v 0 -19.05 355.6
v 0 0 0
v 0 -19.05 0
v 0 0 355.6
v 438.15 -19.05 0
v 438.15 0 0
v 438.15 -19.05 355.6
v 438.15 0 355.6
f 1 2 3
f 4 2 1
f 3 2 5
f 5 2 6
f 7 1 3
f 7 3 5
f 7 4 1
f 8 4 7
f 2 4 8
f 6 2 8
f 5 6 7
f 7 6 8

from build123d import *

# Parameters (mm, degrees)
F0_W     = 438.15
F0_H     = 355.6
F1_DEPTH = 19.05
F0_W_2   = 8.1390114404
F0_H_2   = 77.3205896731


with BuildPart() as f1:
    # F0 (on Front) → F1 (new body)
    with BuildSketch(Plane.XZ):
        with Locations((219.075, 177.8)):
            Rectangle(F0_W, F0_H)
    extrude(amount=F1_DEPTH)


with BuildPart() as f1b:
    # F0 (on Front) → F1, piece 2 (new body)
    with BuildSketch(Plane.XZ):
        with Locations((215.6837597177, -76.6423418882)):
            Rectangle(F0_W_2, F0_H_2)
    extrude(amount=F1_DEPTH)


solid = f1.part
